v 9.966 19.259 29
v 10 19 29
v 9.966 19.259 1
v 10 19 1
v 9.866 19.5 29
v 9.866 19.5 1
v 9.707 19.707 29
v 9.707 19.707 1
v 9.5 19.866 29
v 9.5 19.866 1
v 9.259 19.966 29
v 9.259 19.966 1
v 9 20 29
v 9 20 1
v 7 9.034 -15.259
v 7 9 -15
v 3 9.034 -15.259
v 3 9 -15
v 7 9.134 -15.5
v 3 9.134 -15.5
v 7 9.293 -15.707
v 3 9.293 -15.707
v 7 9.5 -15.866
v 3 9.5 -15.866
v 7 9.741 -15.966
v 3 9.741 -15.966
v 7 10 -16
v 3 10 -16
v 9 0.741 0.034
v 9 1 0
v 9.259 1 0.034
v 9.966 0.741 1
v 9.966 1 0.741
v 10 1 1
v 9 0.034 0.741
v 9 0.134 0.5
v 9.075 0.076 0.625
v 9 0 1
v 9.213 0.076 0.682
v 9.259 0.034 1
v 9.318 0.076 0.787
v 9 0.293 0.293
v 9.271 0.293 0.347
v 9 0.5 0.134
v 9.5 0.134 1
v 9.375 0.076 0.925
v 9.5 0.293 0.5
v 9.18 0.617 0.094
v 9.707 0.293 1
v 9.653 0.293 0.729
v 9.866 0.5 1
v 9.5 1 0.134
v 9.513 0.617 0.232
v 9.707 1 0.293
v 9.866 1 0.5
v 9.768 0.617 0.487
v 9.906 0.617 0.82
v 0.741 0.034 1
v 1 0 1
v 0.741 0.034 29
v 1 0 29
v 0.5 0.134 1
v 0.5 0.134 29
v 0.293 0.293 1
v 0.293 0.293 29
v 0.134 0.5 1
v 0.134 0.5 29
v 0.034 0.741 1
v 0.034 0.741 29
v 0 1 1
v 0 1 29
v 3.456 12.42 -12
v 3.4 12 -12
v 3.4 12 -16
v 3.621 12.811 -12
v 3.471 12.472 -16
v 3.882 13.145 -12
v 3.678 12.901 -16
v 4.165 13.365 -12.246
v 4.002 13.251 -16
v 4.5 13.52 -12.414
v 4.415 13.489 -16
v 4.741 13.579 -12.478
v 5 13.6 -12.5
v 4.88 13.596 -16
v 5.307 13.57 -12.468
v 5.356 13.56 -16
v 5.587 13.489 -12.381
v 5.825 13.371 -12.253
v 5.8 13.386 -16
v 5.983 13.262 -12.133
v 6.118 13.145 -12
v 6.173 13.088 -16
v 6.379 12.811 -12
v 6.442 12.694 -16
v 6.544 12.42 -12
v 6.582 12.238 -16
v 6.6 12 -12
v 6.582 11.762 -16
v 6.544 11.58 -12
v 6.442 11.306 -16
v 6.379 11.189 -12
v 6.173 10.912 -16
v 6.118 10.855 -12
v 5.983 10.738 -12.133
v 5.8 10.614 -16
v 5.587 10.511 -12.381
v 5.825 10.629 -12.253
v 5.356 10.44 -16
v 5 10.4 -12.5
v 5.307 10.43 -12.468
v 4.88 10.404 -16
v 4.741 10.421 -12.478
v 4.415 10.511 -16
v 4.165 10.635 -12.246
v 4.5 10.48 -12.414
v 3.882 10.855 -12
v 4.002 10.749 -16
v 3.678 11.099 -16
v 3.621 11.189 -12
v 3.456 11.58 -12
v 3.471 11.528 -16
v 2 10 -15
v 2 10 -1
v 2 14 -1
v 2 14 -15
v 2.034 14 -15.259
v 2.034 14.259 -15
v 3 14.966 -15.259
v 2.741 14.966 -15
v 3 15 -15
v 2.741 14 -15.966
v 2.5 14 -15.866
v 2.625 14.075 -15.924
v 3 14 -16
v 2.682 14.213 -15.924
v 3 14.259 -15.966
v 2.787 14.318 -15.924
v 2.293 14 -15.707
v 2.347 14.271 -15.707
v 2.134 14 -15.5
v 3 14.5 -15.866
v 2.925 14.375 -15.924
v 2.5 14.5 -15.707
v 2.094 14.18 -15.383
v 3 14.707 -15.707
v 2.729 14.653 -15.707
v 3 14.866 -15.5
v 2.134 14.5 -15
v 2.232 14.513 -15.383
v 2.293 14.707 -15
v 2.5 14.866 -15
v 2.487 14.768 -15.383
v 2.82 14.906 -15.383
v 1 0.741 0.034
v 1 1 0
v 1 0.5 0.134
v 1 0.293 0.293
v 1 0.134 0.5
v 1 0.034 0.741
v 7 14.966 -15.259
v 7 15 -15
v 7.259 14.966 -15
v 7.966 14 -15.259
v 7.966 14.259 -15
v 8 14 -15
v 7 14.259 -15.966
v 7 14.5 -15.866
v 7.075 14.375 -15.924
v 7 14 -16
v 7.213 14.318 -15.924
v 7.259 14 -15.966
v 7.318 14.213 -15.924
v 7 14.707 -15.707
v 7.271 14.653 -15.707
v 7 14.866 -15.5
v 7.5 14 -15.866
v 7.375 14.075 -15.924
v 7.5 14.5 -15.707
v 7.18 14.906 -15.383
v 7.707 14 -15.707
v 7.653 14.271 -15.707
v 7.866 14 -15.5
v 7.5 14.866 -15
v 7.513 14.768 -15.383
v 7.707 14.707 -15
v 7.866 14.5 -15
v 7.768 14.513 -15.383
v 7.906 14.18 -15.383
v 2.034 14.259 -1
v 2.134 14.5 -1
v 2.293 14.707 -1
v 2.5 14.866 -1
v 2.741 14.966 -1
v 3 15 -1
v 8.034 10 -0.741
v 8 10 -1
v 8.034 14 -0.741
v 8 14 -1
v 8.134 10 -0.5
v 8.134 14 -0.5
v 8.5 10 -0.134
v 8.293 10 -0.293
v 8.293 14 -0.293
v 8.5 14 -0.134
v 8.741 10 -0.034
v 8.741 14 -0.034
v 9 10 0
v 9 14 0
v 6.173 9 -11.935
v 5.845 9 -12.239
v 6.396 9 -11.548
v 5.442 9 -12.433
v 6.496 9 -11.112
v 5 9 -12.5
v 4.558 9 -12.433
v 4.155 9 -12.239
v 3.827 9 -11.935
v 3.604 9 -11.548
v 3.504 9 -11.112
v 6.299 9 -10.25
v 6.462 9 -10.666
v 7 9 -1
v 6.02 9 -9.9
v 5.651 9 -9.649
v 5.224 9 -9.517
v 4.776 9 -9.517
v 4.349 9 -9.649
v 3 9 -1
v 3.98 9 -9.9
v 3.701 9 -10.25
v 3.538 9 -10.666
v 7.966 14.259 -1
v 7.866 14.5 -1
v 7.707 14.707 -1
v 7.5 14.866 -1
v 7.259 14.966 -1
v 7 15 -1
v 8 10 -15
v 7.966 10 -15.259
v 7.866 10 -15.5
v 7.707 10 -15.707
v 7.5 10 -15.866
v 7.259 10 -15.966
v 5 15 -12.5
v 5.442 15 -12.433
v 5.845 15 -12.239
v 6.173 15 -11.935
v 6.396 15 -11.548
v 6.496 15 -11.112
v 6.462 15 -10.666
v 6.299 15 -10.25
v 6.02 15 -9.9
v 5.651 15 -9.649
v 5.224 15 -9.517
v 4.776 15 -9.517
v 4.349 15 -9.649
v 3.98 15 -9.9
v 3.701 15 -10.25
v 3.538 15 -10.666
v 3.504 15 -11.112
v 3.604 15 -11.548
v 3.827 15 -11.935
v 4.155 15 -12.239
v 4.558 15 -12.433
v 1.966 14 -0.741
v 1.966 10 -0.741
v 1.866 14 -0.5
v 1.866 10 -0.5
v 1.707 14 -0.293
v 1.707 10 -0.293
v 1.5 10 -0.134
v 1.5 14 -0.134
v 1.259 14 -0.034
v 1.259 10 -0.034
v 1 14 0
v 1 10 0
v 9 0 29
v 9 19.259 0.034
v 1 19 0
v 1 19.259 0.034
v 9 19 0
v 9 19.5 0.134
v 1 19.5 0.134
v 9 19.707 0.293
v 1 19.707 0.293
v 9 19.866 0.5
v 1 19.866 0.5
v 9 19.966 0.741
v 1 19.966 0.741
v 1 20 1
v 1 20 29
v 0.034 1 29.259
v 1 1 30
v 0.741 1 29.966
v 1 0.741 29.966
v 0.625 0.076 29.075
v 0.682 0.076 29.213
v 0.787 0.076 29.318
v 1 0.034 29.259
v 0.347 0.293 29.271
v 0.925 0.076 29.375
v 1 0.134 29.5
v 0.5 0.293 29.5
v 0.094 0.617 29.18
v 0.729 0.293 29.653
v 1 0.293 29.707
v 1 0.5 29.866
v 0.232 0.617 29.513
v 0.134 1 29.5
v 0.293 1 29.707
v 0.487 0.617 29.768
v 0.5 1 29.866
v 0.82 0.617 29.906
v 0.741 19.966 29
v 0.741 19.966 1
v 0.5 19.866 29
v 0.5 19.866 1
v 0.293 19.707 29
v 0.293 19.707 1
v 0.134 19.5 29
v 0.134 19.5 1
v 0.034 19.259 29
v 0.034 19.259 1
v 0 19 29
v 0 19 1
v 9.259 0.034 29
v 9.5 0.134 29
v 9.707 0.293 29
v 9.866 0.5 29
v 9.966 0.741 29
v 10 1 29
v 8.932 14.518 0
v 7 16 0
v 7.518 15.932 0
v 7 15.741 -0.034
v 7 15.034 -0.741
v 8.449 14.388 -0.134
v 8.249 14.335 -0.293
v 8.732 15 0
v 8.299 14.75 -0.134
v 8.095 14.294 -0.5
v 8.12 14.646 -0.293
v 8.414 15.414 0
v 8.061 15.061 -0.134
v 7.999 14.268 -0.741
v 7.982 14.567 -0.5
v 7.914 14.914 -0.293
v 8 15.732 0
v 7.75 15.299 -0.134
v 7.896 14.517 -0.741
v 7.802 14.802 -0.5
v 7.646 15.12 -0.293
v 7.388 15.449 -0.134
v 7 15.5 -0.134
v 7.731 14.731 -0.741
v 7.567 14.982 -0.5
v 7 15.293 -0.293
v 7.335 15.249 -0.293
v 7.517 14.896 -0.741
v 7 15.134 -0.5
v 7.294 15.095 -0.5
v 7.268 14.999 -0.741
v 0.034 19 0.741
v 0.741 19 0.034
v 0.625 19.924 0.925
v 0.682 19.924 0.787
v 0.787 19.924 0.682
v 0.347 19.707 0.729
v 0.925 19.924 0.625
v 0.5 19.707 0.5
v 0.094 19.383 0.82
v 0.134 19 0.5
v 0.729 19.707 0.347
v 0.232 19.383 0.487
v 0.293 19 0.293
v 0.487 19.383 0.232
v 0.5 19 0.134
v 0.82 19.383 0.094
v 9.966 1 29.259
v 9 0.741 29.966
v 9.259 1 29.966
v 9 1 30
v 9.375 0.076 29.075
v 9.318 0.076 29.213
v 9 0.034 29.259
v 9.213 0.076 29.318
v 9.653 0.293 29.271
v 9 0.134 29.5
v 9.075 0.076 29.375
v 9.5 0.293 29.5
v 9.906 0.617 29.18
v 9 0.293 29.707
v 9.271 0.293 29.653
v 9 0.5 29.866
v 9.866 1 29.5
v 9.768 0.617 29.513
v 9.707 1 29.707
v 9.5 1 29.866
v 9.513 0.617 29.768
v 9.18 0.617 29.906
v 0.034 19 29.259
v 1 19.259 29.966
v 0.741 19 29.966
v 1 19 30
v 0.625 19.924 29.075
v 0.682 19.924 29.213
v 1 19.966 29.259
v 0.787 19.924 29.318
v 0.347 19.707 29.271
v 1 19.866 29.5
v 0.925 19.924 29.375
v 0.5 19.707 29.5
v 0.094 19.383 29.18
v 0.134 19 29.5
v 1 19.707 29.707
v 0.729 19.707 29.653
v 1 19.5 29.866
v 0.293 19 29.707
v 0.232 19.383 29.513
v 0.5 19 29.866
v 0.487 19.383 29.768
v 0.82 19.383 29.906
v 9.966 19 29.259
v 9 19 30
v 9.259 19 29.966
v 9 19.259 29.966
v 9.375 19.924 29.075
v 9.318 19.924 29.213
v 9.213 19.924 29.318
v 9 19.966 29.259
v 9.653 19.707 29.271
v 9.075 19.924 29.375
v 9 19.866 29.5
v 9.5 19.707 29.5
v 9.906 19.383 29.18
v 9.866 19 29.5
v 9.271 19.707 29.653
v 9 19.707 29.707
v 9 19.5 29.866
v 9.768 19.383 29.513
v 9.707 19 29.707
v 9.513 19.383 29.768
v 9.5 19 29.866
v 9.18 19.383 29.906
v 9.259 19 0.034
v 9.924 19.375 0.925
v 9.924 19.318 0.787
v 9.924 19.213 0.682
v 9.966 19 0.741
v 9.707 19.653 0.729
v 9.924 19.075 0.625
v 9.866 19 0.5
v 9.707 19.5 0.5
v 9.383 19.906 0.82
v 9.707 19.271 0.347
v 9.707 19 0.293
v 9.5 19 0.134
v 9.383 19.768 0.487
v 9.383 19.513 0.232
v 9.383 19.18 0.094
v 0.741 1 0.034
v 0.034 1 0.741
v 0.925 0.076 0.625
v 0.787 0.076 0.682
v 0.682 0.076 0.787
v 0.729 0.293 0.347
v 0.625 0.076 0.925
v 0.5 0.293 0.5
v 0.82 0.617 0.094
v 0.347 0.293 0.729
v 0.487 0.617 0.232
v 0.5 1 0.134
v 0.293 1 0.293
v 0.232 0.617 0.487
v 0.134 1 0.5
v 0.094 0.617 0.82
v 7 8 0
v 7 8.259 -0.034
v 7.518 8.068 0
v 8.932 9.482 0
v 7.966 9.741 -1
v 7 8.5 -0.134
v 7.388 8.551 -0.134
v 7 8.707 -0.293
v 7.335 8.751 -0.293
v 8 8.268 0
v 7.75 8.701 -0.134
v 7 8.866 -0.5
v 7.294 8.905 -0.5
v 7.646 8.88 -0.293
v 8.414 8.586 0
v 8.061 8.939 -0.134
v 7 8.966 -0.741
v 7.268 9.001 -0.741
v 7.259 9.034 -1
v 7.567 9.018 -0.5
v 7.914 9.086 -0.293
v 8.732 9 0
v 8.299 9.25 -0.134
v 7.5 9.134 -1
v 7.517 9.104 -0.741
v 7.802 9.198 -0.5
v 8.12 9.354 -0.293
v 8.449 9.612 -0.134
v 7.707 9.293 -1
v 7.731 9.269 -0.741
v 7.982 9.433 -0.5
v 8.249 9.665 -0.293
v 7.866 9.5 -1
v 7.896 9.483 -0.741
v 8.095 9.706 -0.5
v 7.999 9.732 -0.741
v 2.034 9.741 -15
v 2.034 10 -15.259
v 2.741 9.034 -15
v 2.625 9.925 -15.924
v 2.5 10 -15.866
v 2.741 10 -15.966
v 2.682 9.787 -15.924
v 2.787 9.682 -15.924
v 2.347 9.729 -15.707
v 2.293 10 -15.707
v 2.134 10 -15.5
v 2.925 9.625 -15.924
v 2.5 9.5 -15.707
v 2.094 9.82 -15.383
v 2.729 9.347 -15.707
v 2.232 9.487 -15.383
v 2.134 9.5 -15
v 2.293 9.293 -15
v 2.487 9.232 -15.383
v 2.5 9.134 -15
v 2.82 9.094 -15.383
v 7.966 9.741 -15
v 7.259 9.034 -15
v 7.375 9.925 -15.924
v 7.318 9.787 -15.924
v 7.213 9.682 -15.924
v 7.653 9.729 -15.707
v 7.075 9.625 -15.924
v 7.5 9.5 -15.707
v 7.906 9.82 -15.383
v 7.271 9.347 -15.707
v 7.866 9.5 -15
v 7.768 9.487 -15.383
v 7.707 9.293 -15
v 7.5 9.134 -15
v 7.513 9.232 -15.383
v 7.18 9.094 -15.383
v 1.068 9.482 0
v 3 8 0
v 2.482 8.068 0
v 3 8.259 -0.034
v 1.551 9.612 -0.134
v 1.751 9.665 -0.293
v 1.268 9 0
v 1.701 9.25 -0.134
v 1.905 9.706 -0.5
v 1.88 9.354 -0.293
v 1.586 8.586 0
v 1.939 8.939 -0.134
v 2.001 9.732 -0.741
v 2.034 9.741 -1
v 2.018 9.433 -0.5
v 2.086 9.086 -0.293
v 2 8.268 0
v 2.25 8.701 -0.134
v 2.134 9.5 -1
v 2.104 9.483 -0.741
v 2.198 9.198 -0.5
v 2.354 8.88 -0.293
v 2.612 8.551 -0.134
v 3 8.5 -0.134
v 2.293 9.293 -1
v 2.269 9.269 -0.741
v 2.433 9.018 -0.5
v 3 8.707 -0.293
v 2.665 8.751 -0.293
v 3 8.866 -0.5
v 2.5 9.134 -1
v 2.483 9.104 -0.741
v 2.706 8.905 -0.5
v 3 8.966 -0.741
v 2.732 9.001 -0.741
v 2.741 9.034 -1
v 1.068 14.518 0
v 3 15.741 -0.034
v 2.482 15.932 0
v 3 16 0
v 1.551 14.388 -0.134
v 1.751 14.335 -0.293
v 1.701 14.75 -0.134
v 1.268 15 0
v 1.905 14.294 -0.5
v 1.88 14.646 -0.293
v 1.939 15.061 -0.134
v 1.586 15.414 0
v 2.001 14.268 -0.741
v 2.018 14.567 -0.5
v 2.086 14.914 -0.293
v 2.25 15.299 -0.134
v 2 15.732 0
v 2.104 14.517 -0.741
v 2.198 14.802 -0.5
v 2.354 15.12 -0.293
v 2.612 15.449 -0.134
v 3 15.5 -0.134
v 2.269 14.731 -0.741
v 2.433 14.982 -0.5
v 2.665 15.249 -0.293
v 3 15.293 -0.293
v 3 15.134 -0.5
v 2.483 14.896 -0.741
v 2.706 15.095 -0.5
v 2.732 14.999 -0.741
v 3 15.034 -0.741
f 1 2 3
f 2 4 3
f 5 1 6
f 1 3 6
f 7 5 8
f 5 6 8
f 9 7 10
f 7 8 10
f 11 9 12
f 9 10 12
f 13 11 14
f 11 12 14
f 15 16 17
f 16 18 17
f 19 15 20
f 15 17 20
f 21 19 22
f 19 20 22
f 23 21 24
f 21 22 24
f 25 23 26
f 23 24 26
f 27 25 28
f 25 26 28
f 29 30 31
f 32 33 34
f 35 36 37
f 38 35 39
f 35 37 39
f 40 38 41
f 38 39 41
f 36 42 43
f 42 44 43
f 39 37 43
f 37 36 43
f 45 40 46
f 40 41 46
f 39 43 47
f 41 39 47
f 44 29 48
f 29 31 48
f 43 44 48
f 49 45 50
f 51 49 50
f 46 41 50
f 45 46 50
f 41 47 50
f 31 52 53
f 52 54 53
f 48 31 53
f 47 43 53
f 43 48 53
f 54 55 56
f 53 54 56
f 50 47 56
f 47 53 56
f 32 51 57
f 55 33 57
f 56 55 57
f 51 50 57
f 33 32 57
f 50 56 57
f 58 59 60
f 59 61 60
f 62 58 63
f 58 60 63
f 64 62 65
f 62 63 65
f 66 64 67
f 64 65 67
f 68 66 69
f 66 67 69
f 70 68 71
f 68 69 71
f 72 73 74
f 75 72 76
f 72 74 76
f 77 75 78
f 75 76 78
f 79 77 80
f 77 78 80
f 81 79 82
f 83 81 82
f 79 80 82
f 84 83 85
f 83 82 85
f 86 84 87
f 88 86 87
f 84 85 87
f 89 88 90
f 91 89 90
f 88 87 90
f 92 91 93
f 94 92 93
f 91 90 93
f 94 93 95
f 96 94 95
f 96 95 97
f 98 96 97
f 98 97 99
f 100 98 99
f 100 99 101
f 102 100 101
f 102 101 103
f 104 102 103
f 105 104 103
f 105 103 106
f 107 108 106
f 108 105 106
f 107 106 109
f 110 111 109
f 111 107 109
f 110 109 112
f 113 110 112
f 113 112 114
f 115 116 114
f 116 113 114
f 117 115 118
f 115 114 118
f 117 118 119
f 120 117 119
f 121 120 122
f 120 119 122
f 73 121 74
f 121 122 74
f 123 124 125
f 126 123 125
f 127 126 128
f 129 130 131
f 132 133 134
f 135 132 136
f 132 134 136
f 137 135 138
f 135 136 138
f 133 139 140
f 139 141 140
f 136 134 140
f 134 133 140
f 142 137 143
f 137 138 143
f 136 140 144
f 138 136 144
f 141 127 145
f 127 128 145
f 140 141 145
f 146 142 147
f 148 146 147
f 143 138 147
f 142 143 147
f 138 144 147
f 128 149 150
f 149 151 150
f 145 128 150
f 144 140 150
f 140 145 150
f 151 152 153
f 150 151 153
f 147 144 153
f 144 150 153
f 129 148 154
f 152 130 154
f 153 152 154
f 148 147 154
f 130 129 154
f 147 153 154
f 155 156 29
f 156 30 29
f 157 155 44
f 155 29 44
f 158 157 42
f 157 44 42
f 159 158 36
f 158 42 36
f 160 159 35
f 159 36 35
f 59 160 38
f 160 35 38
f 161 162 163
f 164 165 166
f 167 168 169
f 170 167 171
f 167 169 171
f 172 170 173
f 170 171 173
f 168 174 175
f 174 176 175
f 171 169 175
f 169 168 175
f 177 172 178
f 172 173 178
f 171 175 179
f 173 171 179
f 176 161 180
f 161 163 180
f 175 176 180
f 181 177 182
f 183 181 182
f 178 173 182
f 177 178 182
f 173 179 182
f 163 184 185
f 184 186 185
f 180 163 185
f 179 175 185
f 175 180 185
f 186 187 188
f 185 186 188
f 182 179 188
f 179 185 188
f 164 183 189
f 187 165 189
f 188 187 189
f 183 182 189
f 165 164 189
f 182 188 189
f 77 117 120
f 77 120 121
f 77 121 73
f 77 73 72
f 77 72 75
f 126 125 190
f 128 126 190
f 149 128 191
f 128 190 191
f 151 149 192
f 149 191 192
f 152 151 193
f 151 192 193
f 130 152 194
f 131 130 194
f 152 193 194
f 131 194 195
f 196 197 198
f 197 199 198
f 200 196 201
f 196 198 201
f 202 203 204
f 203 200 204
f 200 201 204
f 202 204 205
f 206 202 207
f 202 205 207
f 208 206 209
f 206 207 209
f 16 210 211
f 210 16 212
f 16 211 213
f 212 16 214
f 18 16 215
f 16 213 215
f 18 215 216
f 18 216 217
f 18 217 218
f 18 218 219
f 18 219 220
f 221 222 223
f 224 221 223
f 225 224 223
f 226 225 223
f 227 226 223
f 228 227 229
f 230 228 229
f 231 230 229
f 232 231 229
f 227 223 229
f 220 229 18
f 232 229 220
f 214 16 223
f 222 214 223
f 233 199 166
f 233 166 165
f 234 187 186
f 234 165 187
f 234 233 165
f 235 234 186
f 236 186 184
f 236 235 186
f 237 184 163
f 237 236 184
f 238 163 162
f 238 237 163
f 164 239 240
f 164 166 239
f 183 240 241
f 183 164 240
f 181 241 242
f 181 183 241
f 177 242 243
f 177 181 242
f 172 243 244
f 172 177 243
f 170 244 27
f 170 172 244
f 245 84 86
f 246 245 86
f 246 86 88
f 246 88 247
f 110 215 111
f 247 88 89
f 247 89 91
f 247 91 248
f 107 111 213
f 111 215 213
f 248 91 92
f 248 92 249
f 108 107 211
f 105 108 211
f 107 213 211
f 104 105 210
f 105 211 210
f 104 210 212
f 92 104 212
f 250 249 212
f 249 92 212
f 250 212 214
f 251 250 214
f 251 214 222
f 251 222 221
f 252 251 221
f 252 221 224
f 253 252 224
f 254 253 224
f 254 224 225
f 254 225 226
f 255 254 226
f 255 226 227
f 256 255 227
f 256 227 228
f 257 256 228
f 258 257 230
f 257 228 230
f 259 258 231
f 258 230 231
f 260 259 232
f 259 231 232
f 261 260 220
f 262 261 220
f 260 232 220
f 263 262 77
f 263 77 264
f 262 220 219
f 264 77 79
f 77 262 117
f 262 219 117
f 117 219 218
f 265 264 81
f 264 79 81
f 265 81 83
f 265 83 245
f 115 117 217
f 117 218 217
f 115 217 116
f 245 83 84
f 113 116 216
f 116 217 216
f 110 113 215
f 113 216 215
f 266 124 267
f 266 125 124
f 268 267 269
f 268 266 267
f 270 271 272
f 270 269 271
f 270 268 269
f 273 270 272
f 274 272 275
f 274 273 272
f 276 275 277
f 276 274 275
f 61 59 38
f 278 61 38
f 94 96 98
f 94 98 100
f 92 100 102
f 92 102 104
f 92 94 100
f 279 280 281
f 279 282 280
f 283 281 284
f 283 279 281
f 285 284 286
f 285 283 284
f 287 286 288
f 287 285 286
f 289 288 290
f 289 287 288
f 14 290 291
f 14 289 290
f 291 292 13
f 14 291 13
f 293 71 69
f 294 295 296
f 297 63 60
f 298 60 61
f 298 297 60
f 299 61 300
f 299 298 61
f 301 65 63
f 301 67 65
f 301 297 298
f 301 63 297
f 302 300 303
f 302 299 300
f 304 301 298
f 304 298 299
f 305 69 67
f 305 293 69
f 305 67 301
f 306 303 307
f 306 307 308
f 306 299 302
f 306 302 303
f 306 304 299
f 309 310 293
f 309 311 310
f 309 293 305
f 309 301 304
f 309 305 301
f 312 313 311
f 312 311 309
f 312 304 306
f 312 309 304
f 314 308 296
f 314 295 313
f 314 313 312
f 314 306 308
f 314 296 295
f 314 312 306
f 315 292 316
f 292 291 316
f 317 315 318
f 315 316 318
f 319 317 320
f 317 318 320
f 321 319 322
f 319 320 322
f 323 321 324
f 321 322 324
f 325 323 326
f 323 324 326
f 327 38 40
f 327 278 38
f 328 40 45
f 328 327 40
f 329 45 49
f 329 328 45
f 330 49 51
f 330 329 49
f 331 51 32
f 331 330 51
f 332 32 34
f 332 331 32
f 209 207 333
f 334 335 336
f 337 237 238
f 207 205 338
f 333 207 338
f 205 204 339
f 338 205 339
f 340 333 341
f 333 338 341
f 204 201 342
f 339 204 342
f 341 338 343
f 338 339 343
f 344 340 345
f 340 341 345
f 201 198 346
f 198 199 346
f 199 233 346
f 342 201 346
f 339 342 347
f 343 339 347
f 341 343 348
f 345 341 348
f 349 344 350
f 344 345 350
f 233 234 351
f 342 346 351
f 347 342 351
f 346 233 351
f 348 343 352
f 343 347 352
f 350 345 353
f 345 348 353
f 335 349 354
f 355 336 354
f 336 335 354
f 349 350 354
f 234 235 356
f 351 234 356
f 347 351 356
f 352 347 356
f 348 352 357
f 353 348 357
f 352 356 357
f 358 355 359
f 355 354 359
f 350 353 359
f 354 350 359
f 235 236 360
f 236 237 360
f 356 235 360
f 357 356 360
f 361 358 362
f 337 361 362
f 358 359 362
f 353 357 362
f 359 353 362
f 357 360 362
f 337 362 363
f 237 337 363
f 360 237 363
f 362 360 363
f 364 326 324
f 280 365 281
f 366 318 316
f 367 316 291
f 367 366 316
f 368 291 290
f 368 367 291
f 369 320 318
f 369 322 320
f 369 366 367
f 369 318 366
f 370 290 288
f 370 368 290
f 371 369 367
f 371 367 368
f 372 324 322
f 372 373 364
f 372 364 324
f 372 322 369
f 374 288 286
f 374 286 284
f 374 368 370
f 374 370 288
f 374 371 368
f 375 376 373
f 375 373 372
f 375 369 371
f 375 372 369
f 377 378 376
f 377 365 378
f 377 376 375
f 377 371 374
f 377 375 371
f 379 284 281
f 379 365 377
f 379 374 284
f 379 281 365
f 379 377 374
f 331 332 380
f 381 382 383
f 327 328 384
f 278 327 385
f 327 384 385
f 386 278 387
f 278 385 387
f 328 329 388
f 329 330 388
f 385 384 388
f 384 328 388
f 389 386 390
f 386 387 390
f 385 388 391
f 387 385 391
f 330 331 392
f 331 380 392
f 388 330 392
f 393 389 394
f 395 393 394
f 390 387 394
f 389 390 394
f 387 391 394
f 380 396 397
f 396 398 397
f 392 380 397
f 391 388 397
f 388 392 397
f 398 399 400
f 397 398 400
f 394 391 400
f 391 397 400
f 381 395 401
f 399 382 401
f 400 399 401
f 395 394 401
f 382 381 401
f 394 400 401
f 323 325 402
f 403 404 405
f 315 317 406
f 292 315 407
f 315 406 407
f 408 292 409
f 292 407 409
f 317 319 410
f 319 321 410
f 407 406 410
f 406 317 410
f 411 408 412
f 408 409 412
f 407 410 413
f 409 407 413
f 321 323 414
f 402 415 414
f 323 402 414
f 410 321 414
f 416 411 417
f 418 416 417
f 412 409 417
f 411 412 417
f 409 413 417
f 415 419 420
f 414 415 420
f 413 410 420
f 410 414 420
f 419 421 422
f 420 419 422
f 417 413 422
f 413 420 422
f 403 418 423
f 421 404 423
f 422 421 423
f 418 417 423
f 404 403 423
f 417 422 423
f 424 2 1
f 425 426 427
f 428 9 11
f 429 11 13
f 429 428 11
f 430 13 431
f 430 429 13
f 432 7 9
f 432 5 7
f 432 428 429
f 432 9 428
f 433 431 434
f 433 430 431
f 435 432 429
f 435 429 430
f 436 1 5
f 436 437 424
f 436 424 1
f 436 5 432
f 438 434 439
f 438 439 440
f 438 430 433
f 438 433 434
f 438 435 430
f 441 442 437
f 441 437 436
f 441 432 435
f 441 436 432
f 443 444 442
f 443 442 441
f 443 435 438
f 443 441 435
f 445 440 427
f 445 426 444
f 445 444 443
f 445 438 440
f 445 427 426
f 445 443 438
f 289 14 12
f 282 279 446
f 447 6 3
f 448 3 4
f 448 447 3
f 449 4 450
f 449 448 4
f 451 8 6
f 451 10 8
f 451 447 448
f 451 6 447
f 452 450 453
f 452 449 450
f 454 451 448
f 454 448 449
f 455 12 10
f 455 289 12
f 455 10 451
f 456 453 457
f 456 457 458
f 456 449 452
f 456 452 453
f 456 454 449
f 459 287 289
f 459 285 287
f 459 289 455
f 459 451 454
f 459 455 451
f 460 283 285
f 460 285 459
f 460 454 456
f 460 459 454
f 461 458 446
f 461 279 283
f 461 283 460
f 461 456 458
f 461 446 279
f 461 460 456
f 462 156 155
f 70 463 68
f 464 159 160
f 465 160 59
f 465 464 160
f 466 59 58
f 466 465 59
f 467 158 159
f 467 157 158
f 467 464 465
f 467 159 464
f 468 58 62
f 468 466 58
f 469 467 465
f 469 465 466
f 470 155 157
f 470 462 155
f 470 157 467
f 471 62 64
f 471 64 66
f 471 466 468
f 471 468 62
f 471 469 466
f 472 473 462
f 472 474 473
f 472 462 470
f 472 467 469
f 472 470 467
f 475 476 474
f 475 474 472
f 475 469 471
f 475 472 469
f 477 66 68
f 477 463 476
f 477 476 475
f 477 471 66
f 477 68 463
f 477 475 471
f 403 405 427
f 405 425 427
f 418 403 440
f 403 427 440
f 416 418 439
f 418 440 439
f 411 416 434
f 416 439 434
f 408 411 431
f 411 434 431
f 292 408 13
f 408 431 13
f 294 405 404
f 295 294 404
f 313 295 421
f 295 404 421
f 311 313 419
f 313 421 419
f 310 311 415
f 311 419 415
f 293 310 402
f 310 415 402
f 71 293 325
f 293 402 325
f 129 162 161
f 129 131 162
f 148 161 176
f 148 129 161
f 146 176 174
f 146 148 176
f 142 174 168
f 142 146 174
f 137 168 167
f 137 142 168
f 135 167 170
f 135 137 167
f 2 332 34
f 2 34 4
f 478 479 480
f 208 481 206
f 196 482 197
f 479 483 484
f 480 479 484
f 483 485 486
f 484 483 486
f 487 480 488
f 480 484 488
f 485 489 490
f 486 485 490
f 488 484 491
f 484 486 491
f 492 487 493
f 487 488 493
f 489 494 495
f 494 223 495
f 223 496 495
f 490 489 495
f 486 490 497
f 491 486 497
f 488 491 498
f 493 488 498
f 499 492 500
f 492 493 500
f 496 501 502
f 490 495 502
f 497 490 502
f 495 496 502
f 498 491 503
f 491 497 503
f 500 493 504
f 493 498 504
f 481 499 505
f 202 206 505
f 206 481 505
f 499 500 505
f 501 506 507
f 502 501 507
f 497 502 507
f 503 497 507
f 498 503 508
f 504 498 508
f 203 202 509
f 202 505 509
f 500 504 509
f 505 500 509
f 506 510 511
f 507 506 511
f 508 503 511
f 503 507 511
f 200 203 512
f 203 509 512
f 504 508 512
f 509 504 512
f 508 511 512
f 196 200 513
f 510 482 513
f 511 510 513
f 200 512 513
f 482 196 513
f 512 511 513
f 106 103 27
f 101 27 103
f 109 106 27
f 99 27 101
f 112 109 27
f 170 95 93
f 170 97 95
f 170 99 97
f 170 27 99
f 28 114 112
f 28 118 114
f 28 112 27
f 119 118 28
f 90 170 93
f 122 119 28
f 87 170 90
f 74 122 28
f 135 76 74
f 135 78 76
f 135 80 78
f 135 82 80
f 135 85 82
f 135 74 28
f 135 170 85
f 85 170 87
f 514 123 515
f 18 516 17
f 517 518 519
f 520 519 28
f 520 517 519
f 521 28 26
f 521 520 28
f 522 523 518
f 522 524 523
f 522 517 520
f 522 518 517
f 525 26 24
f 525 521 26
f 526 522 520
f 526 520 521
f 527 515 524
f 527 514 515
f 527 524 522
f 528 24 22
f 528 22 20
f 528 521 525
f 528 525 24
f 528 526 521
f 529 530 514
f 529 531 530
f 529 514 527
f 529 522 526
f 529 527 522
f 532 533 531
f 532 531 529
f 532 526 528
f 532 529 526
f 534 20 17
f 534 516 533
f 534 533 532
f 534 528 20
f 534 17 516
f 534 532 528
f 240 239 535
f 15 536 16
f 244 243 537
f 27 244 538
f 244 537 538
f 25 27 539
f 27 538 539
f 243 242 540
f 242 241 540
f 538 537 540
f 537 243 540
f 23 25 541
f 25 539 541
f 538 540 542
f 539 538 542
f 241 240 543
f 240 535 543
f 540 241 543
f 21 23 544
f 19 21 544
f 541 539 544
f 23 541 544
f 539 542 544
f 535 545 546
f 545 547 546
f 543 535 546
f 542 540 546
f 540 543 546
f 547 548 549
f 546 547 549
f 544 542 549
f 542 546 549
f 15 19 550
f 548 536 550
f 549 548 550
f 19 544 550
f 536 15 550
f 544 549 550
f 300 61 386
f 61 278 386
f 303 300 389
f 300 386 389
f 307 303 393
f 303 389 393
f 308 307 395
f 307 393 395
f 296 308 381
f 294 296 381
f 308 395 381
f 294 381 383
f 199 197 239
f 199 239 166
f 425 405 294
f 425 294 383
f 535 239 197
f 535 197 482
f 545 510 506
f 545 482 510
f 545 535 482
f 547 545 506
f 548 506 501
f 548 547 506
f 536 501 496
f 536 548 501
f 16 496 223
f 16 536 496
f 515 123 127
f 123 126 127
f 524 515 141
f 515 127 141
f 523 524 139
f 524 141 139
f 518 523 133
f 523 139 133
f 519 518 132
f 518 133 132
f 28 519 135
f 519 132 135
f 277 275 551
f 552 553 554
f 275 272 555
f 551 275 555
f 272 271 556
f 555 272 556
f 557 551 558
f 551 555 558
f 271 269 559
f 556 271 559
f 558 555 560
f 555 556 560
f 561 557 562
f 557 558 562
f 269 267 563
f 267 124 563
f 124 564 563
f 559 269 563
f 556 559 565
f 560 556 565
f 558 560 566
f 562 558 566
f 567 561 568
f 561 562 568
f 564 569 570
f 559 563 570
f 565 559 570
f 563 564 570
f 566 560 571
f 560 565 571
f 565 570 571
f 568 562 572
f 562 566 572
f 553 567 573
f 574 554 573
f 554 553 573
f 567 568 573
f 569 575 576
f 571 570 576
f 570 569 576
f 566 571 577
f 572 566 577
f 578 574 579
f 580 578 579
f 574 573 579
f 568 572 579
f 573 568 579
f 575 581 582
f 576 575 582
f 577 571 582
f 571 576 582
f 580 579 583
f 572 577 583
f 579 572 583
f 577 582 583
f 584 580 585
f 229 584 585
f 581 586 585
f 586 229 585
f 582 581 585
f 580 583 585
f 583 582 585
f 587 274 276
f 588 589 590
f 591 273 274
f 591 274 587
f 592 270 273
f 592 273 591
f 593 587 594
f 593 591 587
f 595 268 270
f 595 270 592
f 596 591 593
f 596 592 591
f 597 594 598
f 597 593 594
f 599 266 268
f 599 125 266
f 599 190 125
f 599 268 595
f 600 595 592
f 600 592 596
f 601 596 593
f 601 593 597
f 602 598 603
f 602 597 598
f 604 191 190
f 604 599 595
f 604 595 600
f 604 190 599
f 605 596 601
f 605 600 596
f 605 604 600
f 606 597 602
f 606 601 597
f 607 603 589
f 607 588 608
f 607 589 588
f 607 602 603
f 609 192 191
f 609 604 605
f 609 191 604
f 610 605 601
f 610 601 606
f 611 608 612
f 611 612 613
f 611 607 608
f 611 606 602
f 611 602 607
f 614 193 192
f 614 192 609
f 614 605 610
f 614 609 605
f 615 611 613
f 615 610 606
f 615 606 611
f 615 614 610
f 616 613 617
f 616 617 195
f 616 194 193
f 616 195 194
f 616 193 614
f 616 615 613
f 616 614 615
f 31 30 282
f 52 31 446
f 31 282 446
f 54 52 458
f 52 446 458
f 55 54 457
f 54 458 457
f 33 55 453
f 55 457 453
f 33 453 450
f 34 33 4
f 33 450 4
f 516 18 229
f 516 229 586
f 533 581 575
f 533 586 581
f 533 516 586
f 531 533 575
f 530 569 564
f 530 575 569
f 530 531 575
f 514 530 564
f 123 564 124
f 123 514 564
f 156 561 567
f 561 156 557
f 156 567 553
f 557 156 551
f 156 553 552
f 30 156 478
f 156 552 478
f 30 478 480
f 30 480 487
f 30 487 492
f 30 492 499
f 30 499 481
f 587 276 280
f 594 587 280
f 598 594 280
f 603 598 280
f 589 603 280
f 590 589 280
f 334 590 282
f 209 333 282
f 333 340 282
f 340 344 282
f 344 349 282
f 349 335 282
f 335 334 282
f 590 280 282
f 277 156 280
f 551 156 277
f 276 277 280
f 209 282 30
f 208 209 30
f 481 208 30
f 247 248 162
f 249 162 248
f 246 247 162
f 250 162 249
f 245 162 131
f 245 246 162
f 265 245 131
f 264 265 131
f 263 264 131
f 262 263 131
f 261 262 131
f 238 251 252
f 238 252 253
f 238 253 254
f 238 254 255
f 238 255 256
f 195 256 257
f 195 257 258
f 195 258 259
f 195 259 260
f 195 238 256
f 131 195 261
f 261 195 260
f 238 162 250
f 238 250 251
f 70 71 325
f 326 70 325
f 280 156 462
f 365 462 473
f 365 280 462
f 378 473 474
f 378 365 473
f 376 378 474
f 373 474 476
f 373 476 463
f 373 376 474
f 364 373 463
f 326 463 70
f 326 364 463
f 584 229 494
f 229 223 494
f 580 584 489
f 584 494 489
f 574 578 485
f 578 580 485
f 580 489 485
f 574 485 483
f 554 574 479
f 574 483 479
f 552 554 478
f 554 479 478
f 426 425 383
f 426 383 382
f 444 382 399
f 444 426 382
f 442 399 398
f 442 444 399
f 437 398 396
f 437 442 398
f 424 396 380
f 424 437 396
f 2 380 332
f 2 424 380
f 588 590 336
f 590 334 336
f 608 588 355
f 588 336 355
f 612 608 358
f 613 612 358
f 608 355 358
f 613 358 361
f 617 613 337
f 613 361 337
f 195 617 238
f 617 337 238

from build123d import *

# Parameters (mm, degrees)
SKETCH_1_W          = 10
SKETCH_1_H          = 22
EXTRUDE_1_DEPTH     = 30
SKETCH_2_W          = 6
SKETCH_2_H          = 6
EXTRUDE_3_DEPTH     = 14
SKETCH_3_R          = 1.5
CUT_EXTRUDE_1_DEPTH = 6
SKETCH_6_W          = 10
SKETCH_6_H          = 30
CUT_EXTRUDE_2_DEPTH = 2
SKETCH_7_W          = 6
SKETCH_7_H          = 6
EXTRUDE_4_DEPTH     = 2
FILLET_1_R          = 1
SKETCH_8_R          = 1.6
CUT_EXTRUDE_3_DEPTH = 4


with BuildPart() as part:
    # 草图1 → 凸台-拉伸1 (new body)
    with BuildSketch(Plane.XY):
        with Locations((5, 11)):
            Rectangle(SKETCH_1_W, SKETCH_1_H)
    extrude(amount=EXTRUDE_1_DEPTH)

    # 草图2 → 凸台-拉伸3 (add)
    with BuildSketch(Plane.XY):
        with Locations((5, 12)):
            Rectangle(SKETCH_2_W, SKETCH_2_H)
    extrude(amount=-EXTRUDE_3_DEPTH)

    # 草图3 → 切除-拉伸1 (cut)
    with BuildSketch(Plane(origin=(0, 9, 0), x_dir=(-1, 0, 0), z_dir=(0, -1, 0))):
        with Locations(Location((-5, 11, 0), (0, 0, 90))):
            Circle(SKETCH_3_R)
    extrude(amount=-CUT_EXTRUDE_1_DEPTH, mode=Mode.SUBTRACT)

    # 草图6 → 切除-拉伸2 (cut)
    with BuildSketch(Plane(origin=(0, 22, 0), x_dir=(1, 0, 0), z_dir=(0, 1, 0))):
        with Locations((5, -15)):
            Rectangle(SKETCH_6_W, SKETCH_6_H)
    extrude(amount=-CUT_EXTRUDE_2_DEPTH, mode=Mode.SUBTRACT)

    # 草图7 → 凸台-拉伸4 (add)
    with BuildSketch(Plane(origin=(0, 0, -14), x_dir=(-1, 0, 0), z_dir=(0, 0, -1))):
        with Locations((-5, 12)):
            Rectangle(SKETCH_7_W, SKETCH_7_H)
    extrude(amount=EXTRUDE_4_DEPTH)

    # 圆角1
    fillet_1_edges = [part.edges().sort_by_distance(p)[0] for p in [
        (10, 10, 30),
        (2, 9, -8),
        (2, 15, -8),
        (8, 15, -8),
        (8, 9, -8),
        (2, 12, 0),
        (5, 9, 0),
        (8, 12, 0),
        (5, 15, 0),
        (0, 10, 30),
        (0, 10, 0),
        (0, 20, 15),
        (5, 20, 0),
        (10, 20, 15),
        (5, 20, 30),
        (2, 12, -16),
        (5, 15, -16),
        (8, 12, -16),
        (5, 9, -16),
        (10, 10, 0),
        (5, 0, 0),
        (10, 0, 15),
        (0, 0, 15),
        (5, 0, 30),
    ]]
    fillet(fillet_1_edges, radius=FILLET_1_R - 0.0001)  # a hair under: the kernel refuses the full size

    # 草图8 → 切除-拉伸3 (cut)
    with BuildSketch(Plane(origin=(0, 0, -16), x_dir=(-1, 0, 0), z_dir=(0, 0, -1))):
        with Locations((-5, 12)):
            Circle(SKETCH_8_R)
    extrude(amount=-CUT_EXTRUDE_3_DEPTH, mode=Mode.SUBTRACT)


solid = part.part
